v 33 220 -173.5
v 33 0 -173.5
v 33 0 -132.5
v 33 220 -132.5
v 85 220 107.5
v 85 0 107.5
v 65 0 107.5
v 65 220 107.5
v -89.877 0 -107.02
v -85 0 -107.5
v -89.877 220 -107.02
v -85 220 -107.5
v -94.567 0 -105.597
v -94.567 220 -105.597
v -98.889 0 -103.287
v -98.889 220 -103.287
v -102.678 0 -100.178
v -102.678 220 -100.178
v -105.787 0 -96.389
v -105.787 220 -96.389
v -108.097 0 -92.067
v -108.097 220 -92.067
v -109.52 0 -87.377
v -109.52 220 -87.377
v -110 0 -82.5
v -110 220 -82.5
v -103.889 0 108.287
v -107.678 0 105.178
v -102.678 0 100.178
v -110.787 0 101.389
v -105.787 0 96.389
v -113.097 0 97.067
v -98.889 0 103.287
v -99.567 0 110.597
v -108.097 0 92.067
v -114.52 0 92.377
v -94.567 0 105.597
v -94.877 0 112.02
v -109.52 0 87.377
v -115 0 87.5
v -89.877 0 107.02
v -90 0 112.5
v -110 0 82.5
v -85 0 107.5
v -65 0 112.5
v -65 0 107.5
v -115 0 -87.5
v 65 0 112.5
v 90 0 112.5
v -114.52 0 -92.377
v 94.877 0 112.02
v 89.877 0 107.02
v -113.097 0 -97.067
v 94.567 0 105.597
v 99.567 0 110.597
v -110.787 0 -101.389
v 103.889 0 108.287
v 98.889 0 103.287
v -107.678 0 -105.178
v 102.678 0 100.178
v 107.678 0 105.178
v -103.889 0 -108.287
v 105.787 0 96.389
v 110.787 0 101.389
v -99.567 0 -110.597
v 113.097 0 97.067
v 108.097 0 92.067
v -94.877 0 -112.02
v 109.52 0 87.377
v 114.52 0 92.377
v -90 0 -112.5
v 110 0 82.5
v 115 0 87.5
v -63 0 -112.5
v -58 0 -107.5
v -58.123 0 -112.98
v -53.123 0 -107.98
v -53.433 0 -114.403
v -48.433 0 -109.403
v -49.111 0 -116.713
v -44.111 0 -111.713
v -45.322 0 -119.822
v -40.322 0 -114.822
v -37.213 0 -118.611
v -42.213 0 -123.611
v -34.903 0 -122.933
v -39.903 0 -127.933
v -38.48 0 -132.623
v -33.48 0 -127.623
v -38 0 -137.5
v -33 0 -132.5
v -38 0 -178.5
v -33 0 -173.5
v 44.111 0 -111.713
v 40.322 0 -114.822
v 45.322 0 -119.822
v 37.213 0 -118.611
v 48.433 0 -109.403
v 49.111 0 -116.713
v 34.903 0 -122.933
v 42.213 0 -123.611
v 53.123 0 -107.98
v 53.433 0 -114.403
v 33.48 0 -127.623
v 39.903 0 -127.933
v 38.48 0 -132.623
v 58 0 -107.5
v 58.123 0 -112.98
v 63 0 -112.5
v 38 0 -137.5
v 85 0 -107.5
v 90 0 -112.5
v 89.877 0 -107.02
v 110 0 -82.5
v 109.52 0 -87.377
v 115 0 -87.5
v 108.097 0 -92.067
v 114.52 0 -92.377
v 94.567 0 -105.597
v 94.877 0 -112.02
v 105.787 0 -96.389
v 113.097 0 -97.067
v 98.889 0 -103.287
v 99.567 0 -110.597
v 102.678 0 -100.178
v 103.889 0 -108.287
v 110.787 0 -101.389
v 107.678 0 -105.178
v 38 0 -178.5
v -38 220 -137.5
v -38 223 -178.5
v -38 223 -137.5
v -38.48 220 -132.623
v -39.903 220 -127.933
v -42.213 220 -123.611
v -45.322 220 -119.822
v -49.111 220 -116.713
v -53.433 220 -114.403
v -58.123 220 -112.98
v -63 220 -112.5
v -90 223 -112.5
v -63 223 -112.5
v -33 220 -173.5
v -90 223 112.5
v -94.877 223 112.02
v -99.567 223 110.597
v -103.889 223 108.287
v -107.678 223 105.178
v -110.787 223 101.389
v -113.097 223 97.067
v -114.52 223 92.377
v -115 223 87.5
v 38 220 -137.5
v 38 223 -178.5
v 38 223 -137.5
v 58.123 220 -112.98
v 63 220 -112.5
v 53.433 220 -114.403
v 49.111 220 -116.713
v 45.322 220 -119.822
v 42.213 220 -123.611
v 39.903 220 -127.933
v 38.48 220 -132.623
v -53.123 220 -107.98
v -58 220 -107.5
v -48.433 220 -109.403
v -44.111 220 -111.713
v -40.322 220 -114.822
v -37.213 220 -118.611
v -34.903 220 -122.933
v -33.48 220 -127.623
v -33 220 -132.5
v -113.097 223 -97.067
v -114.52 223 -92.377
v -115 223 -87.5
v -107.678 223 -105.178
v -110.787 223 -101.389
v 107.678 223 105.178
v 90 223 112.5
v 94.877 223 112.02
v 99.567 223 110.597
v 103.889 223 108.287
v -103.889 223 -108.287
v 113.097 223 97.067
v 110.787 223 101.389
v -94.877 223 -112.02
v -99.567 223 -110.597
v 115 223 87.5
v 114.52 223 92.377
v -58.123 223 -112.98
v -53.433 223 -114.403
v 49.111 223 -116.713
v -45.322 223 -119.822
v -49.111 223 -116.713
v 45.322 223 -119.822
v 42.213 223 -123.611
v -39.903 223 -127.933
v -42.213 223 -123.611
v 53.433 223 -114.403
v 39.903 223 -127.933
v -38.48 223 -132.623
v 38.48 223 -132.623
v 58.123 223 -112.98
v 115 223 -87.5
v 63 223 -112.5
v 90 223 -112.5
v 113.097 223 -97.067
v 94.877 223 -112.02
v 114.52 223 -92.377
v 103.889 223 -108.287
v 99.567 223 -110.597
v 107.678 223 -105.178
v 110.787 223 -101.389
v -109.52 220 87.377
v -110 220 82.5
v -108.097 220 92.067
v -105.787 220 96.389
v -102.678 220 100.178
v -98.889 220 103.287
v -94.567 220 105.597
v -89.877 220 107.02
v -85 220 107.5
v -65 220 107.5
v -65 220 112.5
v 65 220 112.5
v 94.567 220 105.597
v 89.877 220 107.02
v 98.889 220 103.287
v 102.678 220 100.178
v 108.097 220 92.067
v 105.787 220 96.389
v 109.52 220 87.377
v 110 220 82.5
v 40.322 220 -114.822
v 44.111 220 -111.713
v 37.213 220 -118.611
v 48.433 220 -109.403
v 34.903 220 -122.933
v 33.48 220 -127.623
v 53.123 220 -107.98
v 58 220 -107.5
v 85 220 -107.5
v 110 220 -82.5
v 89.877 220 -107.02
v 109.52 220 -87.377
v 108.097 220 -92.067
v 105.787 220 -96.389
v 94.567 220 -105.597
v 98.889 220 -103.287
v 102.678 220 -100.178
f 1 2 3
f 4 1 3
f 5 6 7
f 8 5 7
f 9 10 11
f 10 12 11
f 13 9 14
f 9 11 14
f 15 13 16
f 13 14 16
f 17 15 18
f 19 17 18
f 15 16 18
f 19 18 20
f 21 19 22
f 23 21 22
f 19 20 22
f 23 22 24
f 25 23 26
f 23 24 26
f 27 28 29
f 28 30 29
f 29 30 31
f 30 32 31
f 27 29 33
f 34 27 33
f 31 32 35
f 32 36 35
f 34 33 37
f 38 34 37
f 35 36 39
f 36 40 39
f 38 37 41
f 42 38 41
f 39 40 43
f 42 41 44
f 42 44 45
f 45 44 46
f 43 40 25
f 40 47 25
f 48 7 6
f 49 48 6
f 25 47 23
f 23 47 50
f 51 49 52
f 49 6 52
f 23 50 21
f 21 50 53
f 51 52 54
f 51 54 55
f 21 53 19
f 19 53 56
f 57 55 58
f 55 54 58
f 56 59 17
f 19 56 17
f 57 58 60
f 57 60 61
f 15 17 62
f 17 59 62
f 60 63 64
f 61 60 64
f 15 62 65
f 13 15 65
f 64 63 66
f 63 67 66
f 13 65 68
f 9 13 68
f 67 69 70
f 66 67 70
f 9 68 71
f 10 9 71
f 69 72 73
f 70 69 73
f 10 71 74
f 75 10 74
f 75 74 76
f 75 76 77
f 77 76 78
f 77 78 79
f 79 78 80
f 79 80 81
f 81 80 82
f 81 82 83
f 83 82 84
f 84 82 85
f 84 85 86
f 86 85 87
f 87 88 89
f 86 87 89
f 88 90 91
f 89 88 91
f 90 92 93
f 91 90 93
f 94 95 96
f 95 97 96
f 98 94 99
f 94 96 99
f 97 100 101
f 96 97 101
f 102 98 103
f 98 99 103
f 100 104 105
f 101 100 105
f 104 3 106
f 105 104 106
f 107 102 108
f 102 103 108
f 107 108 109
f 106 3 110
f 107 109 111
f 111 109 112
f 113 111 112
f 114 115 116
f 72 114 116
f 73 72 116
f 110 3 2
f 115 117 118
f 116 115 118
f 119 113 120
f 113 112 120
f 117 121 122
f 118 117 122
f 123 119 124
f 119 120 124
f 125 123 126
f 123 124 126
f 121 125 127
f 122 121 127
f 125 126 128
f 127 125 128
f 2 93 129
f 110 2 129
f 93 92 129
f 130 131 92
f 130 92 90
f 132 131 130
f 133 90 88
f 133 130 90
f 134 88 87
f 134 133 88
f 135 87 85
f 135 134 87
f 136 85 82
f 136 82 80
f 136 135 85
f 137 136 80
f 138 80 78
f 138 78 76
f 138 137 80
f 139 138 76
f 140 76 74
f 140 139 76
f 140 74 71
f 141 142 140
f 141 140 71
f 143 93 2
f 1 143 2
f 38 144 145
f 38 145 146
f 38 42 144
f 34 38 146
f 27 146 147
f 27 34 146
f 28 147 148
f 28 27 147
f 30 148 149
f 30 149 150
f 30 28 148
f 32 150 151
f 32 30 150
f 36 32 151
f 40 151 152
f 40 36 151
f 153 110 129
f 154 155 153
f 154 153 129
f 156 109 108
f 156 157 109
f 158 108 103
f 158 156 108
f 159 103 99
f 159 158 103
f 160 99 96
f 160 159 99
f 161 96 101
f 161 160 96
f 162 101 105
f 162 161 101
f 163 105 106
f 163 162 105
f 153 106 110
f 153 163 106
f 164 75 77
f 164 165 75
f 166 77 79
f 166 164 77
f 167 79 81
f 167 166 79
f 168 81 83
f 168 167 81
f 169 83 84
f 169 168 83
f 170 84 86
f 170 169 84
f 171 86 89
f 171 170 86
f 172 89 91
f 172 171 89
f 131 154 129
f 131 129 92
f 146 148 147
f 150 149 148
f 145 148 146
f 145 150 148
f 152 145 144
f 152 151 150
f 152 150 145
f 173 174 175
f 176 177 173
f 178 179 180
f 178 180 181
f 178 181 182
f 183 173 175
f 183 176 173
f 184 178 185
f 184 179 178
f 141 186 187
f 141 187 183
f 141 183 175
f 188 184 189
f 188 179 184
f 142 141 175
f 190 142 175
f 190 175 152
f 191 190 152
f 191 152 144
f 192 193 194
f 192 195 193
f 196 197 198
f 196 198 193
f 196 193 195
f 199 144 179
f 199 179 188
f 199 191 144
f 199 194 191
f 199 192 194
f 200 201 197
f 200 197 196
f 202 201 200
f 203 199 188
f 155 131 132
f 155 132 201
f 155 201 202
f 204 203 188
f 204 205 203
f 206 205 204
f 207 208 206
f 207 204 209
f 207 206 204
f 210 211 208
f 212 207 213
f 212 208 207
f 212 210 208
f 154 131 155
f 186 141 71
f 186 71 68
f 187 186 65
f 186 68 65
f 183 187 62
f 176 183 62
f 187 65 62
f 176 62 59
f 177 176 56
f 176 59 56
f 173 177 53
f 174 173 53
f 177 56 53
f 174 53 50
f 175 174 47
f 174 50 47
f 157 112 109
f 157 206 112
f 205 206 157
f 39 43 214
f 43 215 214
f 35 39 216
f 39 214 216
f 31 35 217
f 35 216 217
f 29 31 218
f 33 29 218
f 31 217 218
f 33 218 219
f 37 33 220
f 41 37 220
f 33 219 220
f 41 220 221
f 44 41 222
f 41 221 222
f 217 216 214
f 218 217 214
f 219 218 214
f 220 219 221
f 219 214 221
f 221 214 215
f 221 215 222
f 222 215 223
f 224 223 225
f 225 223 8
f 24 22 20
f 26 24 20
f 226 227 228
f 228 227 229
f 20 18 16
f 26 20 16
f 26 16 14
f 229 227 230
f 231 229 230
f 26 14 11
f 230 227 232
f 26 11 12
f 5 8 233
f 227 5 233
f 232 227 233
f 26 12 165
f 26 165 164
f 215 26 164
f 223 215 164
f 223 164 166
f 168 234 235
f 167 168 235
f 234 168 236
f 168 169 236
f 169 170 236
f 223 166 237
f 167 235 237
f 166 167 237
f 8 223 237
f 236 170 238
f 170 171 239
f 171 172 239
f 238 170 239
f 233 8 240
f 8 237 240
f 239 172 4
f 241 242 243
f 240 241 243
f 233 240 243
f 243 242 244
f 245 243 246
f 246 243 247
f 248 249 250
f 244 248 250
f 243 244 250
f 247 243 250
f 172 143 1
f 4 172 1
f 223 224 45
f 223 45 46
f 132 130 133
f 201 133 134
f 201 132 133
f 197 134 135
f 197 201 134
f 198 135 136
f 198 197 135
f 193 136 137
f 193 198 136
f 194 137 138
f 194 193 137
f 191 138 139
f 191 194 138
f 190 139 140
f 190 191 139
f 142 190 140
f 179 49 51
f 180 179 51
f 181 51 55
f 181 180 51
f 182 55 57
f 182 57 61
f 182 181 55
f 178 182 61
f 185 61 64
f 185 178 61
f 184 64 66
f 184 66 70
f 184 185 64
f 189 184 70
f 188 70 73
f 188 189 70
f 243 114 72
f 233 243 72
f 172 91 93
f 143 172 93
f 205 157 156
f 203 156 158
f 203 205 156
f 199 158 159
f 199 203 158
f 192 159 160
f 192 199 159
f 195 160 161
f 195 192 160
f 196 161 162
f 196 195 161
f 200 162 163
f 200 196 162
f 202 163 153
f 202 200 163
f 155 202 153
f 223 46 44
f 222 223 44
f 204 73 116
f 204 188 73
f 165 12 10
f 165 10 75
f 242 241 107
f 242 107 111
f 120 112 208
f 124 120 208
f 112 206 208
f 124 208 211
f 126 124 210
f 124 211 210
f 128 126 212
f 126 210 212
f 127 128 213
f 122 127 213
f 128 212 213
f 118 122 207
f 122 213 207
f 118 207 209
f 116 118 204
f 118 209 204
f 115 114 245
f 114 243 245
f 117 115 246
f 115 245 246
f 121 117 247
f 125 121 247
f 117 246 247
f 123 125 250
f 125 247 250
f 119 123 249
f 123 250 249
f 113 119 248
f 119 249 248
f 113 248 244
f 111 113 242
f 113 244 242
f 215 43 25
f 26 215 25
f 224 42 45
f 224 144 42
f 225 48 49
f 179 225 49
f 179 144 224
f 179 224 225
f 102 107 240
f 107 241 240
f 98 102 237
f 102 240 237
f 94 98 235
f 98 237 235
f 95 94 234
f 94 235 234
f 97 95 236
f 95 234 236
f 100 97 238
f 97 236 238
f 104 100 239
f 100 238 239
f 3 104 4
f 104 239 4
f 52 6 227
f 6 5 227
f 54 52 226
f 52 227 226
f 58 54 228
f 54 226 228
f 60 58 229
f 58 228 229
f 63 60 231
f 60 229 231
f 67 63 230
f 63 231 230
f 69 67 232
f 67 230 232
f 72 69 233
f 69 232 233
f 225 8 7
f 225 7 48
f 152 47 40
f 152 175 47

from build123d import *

# Parameters (mm, degrees)
BOSS_EXTRUDE1_DEPTH = 220
FILLET1_R           = 25
BOSS_EXTRUDE2_START = 3
BOSS_EXTRUDE2_DEPTH = 3
FILLET2_R           = 25


with BuildPart() as part:
    # Sketch1 → Boss-Extrude1 (new body)
    with BuildSketch(Plane(origin=(0, 0, 0), x_dir=(1, 0, 0), z_dir=(0, 1, 0))):
        Polygon((33, 107.5), (110, 107.5), (110, -107.5), (65, -107.5), (65, -112.5), (115, -112.5), (115, 112.5), (38, 112.5), (38, 178.5), (-38, 178.5), (-38, 112.5), (-115, 112.5), (-115, -112.5), (-65, -112.5), (-65, -107.5), (-110, -107.5), (-110, 107.5), (-33, 107.5), (-33, 173.5), (33, 173.5), align=None)
    extrude(amount=BOSS_EXTRUDE1_DEPTH)

    # Fillet1
    fillet1_edges = [part.edges().sort_by_distance(p)[0] for p in [
        (33, 110, -107.5),
        (-33, 110, -107.5),
        (-38, 110, -112.5),
        (38, 110, -112.5),
    ]]
    fillet(fillet1_edges, radius=FILLET1_R)

    # Sketch2 → Boss-Extrude2 (add)
    with BuildSketch(Plane(origin=(0, 220, 0), x_dir=(1, 0, 0), z_dir=(0, 1, 0)).offset(BOSS_EXTRUDE2_START)):
        with BuildLine():
            Line((-115, -112.5), (115, -112.5))
            Line((115, -112.5), (115, 112.5))
            Line((115, 112.5), (63, 112.5))
            ThreePointArc((63, 112.5), (45.32233047, 119.82233047), (38, 137.5))
            Line((38, 137.5), (38, 178.5))
            Line((38, 178.5), (-38, 178.5))
            Line((-38, 178.5), (-38, 137.5))
            ThreePointArc((-38, 137.5), (-45.32233047, 119.82233047), (-63, 112.5))
            Line((-63, 112.5), (-115, 112.5))
            Line((-115, 112.5), (-115, -112.5))
        make_face()
    extrude(amount=-BOSS_EXTRUDE2_DEPTH)

    # Fillet2
    fillet2_edges = [part.edges().sort_by_distance(p)[0] for p in [
        (110, 110, 107.5),
        (110, 110, -107.5),
        (-110, 110, -107.5),
        (-110, 110, 107.5),
        (-115, 111.5, 112.5),
        (-115, 111.5, -112.5),
        (115, 111.5, -112.5),
        (115, 111.5, 112.5),
    ]]
    fillet(fillet2_edges, radius=FILLET2_R)


solid = part.part
